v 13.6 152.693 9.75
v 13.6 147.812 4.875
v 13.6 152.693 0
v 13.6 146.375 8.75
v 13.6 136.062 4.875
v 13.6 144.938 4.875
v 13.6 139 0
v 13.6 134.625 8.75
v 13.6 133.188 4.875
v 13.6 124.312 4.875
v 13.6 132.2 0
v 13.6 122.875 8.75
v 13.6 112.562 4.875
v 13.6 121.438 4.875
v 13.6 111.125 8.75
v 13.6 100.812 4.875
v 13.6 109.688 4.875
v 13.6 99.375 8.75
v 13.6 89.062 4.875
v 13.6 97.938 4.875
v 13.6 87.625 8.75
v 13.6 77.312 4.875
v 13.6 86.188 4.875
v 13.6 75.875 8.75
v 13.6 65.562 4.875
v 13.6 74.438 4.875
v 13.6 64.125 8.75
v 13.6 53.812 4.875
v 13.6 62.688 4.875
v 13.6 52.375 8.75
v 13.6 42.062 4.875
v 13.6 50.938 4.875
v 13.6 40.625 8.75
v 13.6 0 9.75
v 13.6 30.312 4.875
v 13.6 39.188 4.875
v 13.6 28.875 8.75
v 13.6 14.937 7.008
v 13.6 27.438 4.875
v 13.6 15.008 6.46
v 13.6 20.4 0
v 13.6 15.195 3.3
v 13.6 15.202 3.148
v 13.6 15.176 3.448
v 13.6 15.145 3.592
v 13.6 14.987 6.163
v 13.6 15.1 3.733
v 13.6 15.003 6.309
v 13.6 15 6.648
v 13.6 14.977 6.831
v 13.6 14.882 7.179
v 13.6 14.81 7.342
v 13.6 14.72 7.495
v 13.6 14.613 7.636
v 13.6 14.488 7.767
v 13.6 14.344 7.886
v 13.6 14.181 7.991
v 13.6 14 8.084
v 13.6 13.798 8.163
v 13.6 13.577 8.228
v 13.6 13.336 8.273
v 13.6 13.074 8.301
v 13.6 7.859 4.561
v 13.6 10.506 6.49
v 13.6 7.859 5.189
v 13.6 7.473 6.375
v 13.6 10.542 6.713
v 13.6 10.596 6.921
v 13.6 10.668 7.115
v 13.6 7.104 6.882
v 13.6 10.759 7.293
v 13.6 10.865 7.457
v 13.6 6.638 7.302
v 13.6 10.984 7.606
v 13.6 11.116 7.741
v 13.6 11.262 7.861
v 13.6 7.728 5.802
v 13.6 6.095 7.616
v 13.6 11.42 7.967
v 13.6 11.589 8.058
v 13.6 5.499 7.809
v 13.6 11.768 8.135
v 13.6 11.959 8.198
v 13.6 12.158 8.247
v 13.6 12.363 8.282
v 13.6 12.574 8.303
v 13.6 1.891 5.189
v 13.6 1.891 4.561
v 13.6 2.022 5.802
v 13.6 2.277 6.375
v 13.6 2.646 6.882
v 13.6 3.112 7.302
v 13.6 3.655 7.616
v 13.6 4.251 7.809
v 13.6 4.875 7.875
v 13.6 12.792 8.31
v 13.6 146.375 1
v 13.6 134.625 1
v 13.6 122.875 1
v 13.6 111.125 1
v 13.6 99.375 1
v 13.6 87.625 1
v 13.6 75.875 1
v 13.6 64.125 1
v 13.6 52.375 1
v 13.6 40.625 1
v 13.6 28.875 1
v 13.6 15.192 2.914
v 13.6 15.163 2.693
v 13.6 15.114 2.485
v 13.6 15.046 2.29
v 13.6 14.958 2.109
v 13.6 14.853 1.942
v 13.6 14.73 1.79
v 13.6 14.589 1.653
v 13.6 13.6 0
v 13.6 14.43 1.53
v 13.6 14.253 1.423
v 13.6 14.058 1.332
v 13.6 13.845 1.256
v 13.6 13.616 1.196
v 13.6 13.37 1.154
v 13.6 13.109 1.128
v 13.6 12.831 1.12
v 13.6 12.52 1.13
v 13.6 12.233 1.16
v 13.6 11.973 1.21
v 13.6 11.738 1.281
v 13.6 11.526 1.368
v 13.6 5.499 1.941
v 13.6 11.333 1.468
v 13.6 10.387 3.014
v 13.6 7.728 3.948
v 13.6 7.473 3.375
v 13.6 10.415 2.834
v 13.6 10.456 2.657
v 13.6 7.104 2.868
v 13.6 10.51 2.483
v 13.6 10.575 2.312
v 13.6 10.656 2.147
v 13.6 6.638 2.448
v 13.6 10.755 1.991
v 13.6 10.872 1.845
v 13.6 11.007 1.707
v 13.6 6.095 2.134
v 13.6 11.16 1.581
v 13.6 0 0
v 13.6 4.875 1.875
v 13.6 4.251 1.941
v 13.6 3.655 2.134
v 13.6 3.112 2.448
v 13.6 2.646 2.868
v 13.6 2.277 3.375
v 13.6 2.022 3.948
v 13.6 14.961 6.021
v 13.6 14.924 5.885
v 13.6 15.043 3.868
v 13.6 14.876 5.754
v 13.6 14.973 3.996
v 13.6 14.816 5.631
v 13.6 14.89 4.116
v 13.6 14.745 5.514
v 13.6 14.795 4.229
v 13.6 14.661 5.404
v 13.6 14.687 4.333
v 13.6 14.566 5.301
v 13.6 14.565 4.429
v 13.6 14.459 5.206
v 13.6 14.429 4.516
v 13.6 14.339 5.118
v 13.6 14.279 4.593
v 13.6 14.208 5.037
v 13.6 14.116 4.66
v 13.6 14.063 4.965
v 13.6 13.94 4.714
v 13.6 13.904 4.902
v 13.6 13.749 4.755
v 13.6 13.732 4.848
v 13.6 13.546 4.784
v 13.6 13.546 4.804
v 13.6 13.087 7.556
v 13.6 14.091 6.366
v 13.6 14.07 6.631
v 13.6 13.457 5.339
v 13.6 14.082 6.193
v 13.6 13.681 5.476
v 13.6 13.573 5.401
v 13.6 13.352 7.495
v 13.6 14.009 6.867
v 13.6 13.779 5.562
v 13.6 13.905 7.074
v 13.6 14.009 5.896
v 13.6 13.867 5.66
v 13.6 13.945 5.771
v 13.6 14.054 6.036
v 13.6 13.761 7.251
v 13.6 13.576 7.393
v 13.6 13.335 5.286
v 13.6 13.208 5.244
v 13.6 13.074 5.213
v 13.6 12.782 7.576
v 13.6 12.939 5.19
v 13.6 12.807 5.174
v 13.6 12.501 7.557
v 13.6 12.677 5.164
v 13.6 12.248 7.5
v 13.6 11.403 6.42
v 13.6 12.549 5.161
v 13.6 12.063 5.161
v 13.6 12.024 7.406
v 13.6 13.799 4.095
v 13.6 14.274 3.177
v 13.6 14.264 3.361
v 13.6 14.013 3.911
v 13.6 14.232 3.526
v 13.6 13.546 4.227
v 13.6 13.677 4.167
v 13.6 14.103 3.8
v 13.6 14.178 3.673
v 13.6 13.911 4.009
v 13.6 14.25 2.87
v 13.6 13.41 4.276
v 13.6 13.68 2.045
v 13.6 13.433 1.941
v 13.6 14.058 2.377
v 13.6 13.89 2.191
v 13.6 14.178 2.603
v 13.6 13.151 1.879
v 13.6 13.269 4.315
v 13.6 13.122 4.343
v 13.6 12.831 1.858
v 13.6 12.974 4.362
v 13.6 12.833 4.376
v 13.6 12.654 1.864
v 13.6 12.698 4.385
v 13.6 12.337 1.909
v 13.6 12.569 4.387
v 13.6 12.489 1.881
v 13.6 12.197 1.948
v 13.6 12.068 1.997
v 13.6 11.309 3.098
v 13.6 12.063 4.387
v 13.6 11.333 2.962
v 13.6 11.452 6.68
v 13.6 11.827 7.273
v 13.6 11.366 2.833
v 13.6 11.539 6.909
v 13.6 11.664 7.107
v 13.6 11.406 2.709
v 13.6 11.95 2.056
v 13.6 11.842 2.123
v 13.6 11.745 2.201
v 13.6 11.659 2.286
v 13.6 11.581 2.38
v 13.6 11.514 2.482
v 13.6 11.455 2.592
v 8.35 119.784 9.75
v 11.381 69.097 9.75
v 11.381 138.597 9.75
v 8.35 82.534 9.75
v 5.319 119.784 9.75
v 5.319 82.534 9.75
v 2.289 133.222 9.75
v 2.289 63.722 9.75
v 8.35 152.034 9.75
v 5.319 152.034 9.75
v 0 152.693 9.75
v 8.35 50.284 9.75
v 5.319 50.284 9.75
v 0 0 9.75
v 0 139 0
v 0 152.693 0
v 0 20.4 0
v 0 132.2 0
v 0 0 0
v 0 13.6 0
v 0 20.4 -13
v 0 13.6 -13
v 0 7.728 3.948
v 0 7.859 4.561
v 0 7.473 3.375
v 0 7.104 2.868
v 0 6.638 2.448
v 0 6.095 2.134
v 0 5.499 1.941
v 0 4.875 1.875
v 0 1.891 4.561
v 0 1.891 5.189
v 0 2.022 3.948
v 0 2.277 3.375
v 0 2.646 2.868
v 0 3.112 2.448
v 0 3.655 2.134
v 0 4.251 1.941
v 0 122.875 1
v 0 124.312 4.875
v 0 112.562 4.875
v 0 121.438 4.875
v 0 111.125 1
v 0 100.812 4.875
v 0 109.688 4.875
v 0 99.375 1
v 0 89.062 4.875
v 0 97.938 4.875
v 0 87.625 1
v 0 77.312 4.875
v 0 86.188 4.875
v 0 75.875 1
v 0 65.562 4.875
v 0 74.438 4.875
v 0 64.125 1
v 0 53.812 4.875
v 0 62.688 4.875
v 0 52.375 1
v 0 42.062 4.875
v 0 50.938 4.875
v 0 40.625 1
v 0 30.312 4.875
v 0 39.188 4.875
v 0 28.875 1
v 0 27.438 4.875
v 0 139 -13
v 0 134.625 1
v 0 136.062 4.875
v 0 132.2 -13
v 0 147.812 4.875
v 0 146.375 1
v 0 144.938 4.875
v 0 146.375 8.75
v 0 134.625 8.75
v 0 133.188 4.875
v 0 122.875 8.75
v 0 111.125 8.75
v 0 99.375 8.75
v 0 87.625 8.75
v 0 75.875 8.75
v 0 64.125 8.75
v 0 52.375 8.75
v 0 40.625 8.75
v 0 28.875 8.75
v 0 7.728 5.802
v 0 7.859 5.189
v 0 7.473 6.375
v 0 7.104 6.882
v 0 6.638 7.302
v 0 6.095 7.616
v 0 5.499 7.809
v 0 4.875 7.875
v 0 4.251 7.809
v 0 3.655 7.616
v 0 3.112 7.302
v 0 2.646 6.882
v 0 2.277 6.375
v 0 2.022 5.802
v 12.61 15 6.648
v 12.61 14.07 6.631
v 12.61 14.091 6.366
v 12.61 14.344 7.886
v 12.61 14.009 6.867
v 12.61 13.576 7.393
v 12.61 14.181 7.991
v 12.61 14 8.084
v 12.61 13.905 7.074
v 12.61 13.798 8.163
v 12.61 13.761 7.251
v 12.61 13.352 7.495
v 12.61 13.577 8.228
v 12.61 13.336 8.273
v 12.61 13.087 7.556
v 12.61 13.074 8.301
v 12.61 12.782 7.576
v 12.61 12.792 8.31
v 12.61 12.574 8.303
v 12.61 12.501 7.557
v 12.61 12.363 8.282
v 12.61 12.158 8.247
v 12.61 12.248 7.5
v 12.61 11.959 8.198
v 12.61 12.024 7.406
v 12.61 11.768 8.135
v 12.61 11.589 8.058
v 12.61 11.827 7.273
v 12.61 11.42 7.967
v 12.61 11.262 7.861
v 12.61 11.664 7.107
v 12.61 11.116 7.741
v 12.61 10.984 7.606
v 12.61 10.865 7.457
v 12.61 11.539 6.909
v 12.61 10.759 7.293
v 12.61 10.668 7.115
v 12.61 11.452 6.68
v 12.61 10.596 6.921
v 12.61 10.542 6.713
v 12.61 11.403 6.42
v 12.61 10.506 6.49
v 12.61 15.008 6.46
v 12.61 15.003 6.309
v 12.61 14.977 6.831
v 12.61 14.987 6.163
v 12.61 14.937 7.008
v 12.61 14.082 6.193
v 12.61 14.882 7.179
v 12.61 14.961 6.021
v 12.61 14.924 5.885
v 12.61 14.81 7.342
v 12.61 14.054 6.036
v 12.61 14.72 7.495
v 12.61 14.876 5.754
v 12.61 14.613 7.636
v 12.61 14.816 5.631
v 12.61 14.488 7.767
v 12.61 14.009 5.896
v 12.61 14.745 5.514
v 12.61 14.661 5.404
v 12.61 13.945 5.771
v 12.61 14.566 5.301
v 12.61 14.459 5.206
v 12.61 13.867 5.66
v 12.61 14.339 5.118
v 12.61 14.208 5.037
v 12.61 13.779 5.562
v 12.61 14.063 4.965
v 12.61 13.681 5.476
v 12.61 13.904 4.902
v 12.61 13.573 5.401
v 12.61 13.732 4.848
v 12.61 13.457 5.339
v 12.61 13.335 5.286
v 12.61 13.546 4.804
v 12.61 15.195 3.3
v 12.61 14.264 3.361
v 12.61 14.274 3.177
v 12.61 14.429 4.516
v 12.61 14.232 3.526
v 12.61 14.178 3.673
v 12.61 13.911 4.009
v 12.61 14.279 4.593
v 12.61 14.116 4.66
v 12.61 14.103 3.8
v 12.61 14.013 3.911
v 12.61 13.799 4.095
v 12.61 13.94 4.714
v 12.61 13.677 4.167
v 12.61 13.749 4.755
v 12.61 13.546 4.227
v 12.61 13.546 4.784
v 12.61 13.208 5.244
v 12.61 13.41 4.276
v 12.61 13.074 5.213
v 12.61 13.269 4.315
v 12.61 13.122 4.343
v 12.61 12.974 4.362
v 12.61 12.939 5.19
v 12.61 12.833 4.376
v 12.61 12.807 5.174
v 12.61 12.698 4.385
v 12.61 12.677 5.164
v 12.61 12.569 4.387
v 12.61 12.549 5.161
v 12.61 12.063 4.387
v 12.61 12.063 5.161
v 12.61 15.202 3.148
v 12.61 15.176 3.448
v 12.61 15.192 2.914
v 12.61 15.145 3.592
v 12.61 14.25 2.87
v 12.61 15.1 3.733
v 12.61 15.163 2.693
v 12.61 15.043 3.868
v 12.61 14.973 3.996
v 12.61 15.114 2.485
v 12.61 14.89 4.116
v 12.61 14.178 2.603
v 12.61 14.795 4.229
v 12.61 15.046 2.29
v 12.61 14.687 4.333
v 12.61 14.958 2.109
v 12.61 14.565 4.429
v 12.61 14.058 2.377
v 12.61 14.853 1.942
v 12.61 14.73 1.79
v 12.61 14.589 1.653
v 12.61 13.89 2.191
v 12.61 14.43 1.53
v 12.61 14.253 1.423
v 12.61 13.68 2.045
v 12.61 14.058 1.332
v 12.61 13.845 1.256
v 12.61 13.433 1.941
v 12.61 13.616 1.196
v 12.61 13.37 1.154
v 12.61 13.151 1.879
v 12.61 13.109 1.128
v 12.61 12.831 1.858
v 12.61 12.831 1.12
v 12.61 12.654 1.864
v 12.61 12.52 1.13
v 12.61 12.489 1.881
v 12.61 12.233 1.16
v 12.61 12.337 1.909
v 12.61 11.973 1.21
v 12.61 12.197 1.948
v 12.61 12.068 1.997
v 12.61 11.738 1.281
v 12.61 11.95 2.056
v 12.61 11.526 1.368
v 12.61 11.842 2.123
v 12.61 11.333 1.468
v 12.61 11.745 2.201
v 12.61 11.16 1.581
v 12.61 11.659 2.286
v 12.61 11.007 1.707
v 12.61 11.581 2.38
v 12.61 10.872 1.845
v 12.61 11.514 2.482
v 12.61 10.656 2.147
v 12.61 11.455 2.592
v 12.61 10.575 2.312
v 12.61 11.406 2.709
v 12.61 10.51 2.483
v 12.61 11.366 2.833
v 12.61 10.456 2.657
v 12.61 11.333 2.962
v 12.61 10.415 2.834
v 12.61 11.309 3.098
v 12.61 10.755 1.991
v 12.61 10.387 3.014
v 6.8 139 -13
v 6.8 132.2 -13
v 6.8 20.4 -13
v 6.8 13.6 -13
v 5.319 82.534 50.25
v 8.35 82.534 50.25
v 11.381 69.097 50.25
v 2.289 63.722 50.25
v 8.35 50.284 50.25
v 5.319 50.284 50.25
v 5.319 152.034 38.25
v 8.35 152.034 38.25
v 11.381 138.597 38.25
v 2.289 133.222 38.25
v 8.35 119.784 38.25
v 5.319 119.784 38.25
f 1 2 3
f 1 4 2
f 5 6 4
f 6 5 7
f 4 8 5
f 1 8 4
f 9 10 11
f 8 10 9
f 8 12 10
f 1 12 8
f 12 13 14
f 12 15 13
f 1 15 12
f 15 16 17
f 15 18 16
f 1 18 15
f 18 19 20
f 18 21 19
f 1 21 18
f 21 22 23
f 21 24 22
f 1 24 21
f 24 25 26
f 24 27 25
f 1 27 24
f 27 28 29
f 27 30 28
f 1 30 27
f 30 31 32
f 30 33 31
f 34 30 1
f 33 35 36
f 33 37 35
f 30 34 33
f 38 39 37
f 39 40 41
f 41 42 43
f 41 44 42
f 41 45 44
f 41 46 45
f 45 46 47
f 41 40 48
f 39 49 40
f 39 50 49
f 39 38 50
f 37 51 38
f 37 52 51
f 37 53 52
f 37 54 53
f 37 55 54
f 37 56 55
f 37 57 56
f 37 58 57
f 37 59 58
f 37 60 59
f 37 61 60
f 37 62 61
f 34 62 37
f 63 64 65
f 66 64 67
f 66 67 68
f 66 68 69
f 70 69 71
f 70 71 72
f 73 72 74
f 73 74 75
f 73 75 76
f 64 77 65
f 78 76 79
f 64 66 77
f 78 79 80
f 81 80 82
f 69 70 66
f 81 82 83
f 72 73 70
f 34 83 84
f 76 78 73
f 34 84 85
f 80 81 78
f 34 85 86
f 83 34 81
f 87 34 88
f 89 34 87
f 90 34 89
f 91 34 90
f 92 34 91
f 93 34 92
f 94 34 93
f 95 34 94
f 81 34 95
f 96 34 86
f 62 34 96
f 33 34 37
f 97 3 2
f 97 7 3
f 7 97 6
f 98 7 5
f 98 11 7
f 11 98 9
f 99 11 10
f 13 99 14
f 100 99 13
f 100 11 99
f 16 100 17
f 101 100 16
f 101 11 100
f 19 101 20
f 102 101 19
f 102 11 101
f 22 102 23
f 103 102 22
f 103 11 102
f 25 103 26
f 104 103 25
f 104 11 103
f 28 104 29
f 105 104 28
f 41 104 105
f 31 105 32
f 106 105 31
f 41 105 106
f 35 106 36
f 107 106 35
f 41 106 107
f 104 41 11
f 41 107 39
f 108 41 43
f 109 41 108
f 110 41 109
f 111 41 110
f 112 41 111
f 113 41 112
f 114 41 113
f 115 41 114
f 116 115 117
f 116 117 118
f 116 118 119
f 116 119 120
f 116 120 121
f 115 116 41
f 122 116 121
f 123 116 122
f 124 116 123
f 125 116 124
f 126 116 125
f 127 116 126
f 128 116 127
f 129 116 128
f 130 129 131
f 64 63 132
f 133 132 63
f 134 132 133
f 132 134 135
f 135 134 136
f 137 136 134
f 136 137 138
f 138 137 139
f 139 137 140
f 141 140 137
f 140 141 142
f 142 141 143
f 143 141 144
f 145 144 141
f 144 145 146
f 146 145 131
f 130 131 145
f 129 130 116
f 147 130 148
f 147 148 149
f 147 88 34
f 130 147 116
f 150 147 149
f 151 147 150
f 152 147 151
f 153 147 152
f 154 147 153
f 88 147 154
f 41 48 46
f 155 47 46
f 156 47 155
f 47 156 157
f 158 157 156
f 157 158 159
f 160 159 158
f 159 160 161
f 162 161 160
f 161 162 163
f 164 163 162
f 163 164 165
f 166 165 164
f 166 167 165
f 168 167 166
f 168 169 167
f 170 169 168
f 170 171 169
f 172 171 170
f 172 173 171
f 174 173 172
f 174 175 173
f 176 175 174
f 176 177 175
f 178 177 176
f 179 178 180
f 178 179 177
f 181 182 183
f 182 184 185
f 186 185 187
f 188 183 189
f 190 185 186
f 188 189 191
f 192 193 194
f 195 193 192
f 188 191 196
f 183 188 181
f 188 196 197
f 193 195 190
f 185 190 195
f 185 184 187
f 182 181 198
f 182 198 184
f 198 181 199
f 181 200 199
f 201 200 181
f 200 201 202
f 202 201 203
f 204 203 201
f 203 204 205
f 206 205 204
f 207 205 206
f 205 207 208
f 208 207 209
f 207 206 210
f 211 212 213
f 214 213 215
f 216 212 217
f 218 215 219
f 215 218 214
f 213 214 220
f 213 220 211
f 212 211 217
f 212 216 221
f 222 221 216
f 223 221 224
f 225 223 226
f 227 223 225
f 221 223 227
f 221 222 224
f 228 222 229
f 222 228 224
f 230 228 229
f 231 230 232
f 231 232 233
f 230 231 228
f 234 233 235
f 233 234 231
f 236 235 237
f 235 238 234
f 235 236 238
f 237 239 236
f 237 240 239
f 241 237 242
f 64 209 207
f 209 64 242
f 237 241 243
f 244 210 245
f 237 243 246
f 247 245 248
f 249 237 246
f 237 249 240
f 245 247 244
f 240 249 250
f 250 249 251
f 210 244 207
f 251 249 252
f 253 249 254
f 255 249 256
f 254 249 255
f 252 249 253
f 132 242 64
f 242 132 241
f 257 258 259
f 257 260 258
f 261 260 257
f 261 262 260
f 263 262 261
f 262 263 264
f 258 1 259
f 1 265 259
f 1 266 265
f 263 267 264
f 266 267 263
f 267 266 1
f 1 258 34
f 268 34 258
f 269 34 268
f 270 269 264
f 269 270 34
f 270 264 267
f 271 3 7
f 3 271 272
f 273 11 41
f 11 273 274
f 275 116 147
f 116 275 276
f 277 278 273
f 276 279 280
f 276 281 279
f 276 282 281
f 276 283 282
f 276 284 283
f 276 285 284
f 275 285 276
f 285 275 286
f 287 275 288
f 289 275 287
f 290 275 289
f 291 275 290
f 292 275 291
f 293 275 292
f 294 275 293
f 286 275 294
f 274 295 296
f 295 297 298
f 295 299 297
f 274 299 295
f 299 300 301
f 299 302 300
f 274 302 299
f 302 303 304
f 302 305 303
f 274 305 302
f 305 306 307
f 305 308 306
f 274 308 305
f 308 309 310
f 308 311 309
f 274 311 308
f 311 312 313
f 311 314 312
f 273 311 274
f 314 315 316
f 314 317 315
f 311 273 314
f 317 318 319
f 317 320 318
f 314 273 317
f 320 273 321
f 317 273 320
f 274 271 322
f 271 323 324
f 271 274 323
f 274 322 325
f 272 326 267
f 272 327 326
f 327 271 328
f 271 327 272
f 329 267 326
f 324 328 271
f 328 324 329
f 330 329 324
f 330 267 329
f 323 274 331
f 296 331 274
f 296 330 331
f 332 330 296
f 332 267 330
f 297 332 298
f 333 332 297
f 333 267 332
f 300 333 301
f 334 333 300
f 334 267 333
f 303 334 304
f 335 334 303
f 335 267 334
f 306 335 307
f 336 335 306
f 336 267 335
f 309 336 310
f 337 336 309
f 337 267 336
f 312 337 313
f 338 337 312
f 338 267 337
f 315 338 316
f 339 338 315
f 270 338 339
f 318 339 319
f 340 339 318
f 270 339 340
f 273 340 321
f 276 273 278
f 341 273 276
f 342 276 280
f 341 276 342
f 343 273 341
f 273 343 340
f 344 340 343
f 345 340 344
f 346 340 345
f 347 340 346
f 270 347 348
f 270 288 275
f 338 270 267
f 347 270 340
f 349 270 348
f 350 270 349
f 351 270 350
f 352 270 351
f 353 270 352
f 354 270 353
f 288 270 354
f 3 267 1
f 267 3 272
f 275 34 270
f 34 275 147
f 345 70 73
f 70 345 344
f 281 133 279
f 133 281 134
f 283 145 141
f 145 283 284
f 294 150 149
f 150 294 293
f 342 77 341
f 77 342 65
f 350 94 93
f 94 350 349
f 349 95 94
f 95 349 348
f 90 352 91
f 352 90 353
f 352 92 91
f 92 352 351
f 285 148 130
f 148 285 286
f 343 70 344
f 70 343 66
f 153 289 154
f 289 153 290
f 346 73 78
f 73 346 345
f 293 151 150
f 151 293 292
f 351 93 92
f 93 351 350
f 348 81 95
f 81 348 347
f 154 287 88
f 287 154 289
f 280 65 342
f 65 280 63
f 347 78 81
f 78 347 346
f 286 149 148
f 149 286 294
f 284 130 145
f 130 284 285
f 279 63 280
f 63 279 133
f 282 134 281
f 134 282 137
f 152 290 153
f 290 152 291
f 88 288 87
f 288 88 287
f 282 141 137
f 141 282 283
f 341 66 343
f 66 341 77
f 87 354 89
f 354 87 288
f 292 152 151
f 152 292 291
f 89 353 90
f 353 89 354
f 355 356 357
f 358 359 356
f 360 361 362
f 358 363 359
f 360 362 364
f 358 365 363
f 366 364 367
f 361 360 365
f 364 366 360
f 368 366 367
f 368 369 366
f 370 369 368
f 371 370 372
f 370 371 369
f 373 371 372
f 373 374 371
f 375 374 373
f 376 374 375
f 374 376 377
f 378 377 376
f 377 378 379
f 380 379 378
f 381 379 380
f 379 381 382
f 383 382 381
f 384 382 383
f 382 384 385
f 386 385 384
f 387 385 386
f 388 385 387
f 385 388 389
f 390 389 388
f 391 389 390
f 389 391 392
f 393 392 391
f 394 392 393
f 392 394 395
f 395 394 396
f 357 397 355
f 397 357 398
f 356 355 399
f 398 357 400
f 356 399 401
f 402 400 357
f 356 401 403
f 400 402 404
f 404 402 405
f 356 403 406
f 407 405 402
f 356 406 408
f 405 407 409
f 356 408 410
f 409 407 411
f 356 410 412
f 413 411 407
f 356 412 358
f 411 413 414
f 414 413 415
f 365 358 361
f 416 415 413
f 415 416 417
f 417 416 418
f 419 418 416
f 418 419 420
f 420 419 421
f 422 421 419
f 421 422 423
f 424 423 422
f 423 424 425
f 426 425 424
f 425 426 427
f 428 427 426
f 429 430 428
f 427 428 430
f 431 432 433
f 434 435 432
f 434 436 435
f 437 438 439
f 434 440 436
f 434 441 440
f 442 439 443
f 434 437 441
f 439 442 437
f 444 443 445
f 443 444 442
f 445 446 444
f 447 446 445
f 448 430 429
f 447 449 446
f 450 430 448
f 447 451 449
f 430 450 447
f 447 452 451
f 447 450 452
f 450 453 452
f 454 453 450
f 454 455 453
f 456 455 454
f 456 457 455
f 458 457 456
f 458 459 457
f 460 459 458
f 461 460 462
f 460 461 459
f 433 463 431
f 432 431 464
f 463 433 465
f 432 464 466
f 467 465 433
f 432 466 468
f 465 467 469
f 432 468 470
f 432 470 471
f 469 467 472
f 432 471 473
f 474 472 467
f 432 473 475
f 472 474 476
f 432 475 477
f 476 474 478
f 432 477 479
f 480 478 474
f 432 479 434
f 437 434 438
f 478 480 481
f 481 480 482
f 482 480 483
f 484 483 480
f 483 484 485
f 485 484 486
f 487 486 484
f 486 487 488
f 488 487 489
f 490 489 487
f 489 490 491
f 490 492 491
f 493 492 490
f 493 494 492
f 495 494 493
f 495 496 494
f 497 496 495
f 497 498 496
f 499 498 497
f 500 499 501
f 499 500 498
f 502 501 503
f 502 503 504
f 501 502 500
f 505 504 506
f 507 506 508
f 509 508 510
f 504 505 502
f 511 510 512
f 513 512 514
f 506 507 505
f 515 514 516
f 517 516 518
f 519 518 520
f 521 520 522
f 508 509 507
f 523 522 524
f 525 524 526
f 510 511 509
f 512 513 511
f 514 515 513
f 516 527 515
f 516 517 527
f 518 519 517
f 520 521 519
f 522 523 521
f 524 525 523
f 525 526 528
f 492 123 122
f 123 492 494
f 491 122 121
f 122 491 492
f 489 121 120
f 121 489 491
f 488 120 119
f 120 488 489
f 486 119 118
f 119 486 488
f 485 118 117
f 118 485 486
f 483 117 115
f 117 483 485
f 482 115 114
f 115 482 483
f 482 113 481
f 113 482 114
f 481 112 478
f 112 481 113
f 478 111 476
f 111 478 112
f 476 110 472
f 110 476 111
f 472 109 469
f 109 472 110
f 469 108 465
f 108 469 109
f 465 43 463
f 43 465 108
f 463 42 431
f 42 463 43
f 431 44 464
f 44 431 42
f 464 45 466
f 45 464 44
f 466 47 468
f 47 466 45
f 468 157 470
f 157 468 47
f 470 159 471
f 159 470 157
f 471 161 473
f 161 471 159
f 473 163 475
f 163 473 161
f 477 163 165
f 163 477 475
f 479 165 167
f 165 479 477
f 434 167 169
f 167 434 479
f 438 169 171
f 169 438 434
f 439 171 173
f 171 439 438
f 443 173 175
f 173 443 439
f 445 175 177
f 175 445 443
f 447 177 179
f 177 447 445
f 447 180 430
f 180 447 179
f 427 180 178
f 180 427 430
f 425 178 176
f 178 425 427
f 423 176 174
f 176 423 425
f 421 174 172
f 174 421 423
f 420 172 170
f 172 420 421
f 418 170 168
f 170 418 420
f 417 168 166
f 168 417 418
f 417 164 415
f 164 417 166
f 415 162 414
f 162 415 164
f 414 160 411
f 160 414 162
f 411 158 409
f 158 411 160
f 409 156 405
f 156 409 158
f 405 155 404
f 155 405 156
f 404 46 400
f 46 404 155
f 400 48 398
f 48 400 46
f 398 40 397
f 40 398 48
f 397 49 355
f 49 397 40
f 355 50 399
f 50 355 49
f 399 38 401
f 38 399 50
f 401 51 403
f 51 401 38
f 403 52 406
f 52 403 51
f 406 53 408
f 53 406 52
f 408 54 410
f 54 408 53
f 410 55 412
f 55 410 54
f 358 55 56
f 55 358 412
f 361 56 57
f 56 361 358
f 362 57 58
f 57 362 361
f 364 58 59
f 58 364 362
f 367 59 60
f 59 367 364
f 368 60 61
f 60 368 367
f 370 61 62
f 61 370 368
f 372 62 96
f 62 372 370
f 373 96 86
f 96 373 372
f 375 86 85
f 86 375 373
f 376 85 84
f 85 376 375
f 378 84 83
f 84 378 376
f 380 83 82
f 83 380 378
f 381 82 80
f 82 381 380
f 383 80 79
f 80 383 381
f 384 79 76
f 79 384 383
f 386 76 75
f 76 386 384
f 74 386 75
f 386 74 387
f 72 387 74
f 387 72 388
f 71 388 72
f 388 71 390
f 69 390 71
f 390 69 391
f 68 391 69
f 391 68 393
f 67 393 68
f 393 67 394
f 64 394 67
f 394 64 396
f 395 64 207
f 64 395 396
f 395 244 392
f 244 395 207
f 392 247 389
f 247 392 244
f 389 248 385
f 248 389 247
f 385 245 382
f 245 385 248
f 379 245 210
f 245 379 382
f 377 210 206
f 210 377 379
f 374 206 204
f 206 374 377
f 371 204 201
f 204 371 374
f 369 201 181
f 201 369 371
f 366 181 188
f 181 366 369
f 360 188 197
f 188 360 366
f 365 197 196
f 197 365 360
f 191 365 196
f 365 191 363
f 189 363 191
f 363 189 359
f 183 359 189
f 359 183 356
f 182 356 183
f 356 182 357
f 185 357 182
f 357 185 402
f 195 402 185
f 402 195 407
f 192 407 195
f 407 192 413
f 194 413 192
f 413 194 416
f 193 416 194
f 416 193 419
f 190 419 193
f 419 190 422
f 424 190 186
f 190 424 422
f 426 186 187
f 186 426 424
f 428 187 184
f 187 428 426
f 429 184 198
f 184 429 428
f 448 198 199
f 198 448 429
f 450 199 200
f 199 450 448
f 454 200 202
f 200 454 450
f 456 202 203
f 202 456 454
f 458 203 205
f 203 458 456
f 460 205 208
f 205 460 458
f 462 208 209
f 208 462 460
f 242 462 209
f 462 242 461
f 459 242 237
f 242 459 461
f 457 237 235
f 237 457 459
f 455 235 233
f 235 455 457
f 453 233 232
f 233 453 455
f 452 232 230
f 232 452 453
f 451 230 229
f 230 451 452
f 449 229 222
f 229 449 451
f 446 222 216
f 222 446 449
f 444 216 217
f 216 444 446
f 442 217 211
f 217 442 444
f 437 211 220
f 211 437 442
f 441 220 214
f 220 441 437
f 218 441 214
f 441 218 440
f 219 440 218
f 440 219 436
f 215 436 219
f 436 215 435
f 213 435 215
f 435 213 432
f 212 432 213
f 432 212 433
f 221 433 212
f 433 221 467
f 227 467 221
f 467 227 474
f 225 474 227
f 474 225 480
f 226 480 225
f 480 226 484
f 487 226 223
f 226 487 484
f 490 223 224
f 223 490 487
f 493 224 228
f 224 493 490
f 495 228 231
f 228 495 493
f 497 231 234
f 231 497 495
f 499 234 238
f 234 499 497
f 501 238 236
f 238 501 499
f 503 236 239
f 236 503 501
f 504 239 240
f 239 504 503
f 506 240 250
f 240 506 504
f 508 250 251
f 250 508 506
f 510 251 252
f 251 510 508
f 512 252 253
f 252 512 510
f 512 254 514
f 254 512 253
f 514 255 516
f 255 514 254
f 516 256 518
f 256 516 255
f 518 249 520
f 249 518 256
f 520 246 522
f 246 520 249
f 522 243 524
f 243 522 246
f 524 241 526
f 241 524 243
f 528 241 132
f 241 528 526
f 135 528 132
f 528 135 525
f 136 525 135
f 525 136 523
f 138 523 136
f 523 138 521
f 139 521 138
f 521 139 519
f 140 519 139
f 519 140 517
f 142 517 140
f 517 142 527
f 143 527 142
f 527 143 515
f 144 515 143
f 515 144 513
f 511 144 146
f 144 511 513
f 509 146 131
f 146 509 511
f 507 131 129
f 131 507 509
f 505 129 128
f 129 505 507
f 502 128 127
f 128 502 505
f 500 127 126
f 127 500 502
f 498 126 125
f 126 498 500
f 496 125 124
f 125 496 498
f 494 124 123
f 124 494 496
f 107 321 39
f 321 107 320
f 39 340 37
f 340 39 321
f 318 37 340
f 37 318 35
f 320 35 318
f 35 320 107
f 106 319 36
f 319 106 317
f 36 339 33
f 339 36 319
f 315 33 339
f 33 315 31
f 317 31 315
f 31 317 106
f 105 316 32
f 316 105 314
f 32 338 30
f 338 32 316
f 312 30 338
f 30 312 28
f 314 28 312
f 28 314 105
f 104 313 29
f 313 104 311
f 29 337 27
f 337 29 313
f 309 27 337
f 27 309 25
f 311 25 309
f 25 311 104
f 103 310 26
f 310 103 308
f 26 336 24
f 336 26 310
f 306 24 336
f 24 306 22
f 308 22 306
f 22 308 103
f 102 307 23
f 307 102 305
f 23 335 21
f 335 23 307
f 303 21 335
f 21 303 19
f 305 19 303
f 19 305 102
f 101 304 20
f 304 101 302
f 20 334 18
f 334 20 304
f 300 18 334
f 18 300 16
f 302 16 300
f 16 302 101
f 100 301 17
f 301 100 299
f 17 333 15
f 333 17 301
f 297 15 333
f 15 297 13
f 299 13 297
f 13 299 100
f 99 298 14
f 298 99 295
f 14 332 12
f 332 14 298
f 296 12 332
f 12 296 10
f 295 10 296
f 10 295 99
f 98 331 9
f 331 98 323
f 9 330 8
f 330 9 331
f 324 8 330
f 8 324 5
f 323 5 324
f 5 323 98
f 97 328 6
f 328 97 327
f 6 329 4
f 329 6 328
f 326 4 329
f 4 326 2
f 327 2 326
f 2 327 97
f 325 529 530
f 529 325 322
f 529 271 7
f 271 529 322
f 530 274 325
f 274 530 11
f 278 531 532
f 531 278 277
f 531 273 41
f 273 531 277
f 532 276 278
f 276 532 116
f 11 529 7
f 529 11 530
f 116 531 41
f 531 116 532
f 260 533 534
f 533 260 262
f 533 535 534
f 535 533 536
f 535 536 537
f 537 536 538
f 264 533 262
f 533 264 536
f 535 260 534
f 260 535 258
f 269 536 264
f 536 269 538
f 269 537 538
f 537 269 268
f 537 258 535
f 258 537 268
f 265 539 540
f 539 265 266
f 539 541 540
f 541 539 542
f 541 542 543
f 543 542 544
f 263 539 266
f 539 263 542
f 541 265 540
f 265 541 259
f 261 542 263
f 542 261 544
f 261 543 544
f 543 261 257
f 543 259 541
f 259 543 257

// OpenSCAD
// file: values.scad
$fs=0.1;
//Constants:
edgeRadius=1.5;
underKeyWidth=13.6;
baseHeight=9.75;
genh=5.791666666666667;
a=27.423996629776394;
b=12.370392724366756;
c=12.370392724366756;
d=38.393595281686956;
overhead=65.81759191146335;
keyTravelDistance=13.0;
desiredGamut=24;
shift=3.092598181091689;
holeScale=0.5;
stalkScale=0.48;

Points = [
[shift,a,0],//0
[(b-shift),0,0],//1
[(b+shift),0,0],//2
[(b+c-shift),d,0],//3
[(c+shift),(a+d),0],//4
[(c-shift),(a+d),0],//5
[shift,a,keyTravelDistance],//6
[(b-shift),0,keyTravelDistance],//7
[(b+shift),0,keyTravelDistance],//8
[(b+c-shift),d,keyTravelDistance],//9
[(c+shift),(a+d),keyTravelDistance],//10
[(c-shift),(a+d),keyTravelDistance],//11
];
Faces = [
[0,1,2,3,4,5],
[1,0,6,7],
[2,1,7,8],
[3,2,8,9],
[4,3,9,10],
[5,4,10,11],
[0,5,11,6],
[11,10,9,8,7,6] 
];
// file: keytop.scad
include<values.scad>;
keytop();

module keytopShape(){
polyhedron(Points,Faces);
}
module keytop(){
difference(){
keytopShape();
translate([(b+c)/4,(d+a)/4,-0.1])
scale(holeScale,holeScale,holeScale)
keytopShape();
edge(6,11,1,-1);
edge(6,7,1,1);
edge(7,8,1,1);
edge(8,9,1,1);
edge(9,10,1,-1,-1);
edge(10,11,1,-1);
}
module edge (point1,point2,d1,d2,d3=1){
difference(){
translate([Points[point1][0],Points[point1][1],Points[point1][2]])
rotate([0,90,atan((Points[point2][1]-Points[point1][1])/(Points[point2][0]-Points[point1][0]))])
translate([0,0,d3*30])
rotate(45,0,0)
cube([pow(2*(edgeRadius*edgeRadius),1/2),pow(2*(edgeRadius*edgeRadius),1/2),90],true);
translate([Points[point1][0],Points[point1][1],Points[point1][2]])
rotate([0,90,atan((Points[point2][1]-Points[point1][1])/(Points[point2][0]-Points[point1][0]))])
translate([d1*edgeRadius,d2*edgeRadius,d3*30])
cylinder(90,edgeRadius,edgeRadius, true);
}
}

}
// main file
use<keytop.scad>
include<values.scad>
rotate([0,90,0])3_3();
module 3_3(keytops=false){
length=152.69259191146335;
rotate([0,-90,0]){
//Main Base:
difference(){
cube([underKeyWidth,length,baseHeight],false);
translate([-.1,0.5*baseHeight,0.5*baseHeight])rotate([0,90,0])
cylinder((underKeyWidth+.2),r=3, false);
translate([underKeyWidth-.99,10,0.125*baseHeight])
rotate([90,0,90])
linear_extrude(height=1){
text("3",size=baseHeight*0.75);
}

//Warp Cuts:
translate([-1,0.0+25+0.25*baseHeight,baseHeight-1])
rotate([0,90,0])
linear_extrude(height=underKeyWidth+2)
polygon(points=[[0.5*baseHeight-1,0],[baseHeight-2,0.25*baseHeight-1],[0.5*baseHeight-1,0.5*baseHeight-2],[0,0.25*baseHeight-1]]);
translate([-1,11.75+25+0.25*baseHeight,baseHeight-1])
rotate([0,90,0])
linear_extrude(height=underKeyWidth+2)
polygon(points=[[0.5*baseHeight-1,0],[baseHeight-2,0.25*baseHeight-1],[0.5*baseHeight-1,0.5*baseHeight-2],[0,0.25*baseHeight-1]]);
translate([-1,23.5+25+0.25*baseHeight,baseHeight-1])
rotate([0,90,0])
linear_extrude(height=underKeyWidth+2)
polygon(points=[[0.5*baseHeight-1,0],[baseHeight-2,0.25*baseHeight-1],[0.5*baseHeight-1,0.5*baseHeight-2],[0,0.25*baseHeight-1]]);
translate([-1,35.25+25+0.25*baseHeight,baseHeight-1])
rotate([0,90,0])
linear_extrude(height=underKeyWidth+2)
polygon(points=[[0.5*baseHeight-1,0],[baseHeight-2,0.25*baseHeight-1],[0.5*baseHeight-1,0.5*baseHeight-2],[0,0.25*baseHeight-1]]);
translate([-1,47.0+25+0.25*baseHeight,baseHeight-1])
rotate([0,90,0])
linear_extrude(height=underKeyWidth+2)
polygon(points=[[0.5*baseHeight-1,0],[baseHeight-2,0.25*baseHeight-1],[0.5*baseHeight-1,0.5*baseHeight-2],[0,0.25*baseHeight-1]]);
translate([-1,58.75+25+0.25*baseHeight,baseHeight-1])
rotate([0,90,0])
linear_extrude(height=underKeyWidth+2)
polygon(points=[[0.5*baseHeight-1,0],[baseHeight-2,0.25*baseHeight-1],[0.5*baseHeight-1,0.5*baseHeight-2],[0,0.25*baseHeight-1]]);
translate([-1,70.5+25+0.25*baseHeight,baseHeight-1])
rotate([0,90,0])
linear_extrude(height=underKeyWidth+2)
polygon(points=[[0.5*baseHeight-1,0],[baseHeight-2,0.25*baseHeight-1],[0.5*baseHeight-1,0.5*baseHeight-2],[0,0.25*baseHeight-1]]);
translate([-1,82.25+25+0.25*baseHeight,baseHeight-1])
rotate([0,90,0])
linear_extrude(height=underKeyWidth+2)
polygon(points=[[0.5*baseHeight-1,0],[baseHeight-2,0.25*baseHeight-1],[0.5*baseHeight-1,0.5*baseHeight-2],[0,0.25*baseHeight-1]]);
translate([-1,94.0+25+0.25*baseHeight,baseHeight-1])
rotate([0,90,0])
linear_extrude(height=underKeyWidth+2)
polygon(points=[[0.5*baseHeight-1,0],[baseHeight-2,0.25*baseHeight-1],[0.5*baseHeight-1,0.5*baseHeight-2],[0,0.25*baseHeight-1]]);
translate([-1,105.75+25+0.25*baseHeight,baseHeight-1])
rotate([0,90,0])
linear_extrude(height=underKeyWidth+2)
polygon(points=[[0.5*baseHeight-1,0],[baseHeight-2,0.25*baseHeight-1],[0.5*baseHeight-1,0.5*baseHeight-2],[0,0.25*baseHeight-1]]);
translate([-1,117.5+25+0.25*baseHeight,baseHeight-1])
rotate([0,90,0])
linear_extrude(height=underKeyWidth+2)
polygon(points=[[0.5*baseHeight-1,0],[baseHeight-2,0.25*baseHeight-1],[0.5*baseHeight-1,0.5*baseHeight-2],[0,0.25*baseHeight-1]]);
}
//Key Stalks:
translate([shift/4,(genh*3-(d+a)/2+overhead),baseHeight]){
linear_extrude(height=(keyTravelDistance*1.5+desiredGamut-3)){
scale((stalkScale+holeScale)/2,stalkScale)
polygon(points=[
[Points[0][0],Points[0][1]],[Points[1][0],Points[1][1]],[Points[2][0],Points[2][1]],[Points[3][0],Points[3][1]],[Points[4][0],Points[4][1]],[Points[5][0],Points[5][1]],[Points[6][0],Points[6][1]]
]);
}
if(keytops)
translate([0,(-0.5*(a+d)),(keyTravelDistance*1.5+desiredGamut-3+40)])
keytop();
}
translate([shift/4,(genh*15-(d+a)/2+overhead),baseHeight]){
linear_extrude(height=(keyTravelDistance*1.5+desiredGamut-15)){
scale((stalkScale+holeScale)/2,stalkScale)
polygon(points=[
[Points[0][0],Points[0][1]],[Points[1][0],Points[1][1]],[Points[2][0],Points[2][1]],[Points[3][0],Points[3][1]],[Points[4][0],Points[4][1]],[Points[5][0],Points[5][1]],[Points[6][0],Points[6][1]]
]);
}
if(keytops)
translate([0,(-0.5*(a+d)),(keyTravelDistance*1.5+desiredGamut-15+40)])
keytop();
}
//Feet:
difference(){union(){translate([0,132.2,-13.0]){
cube([13.6,6.8,13.0],false);}
translate([0,13.6,-13.0]){
cube([13.6,6.8,13.0],false);}}
translate([13.6,0.5,0])
rotate([0,27.613027823084472,0])
translate([0,0,-26.0])
cube([26.0,157.375,26.0]);
}
}}
